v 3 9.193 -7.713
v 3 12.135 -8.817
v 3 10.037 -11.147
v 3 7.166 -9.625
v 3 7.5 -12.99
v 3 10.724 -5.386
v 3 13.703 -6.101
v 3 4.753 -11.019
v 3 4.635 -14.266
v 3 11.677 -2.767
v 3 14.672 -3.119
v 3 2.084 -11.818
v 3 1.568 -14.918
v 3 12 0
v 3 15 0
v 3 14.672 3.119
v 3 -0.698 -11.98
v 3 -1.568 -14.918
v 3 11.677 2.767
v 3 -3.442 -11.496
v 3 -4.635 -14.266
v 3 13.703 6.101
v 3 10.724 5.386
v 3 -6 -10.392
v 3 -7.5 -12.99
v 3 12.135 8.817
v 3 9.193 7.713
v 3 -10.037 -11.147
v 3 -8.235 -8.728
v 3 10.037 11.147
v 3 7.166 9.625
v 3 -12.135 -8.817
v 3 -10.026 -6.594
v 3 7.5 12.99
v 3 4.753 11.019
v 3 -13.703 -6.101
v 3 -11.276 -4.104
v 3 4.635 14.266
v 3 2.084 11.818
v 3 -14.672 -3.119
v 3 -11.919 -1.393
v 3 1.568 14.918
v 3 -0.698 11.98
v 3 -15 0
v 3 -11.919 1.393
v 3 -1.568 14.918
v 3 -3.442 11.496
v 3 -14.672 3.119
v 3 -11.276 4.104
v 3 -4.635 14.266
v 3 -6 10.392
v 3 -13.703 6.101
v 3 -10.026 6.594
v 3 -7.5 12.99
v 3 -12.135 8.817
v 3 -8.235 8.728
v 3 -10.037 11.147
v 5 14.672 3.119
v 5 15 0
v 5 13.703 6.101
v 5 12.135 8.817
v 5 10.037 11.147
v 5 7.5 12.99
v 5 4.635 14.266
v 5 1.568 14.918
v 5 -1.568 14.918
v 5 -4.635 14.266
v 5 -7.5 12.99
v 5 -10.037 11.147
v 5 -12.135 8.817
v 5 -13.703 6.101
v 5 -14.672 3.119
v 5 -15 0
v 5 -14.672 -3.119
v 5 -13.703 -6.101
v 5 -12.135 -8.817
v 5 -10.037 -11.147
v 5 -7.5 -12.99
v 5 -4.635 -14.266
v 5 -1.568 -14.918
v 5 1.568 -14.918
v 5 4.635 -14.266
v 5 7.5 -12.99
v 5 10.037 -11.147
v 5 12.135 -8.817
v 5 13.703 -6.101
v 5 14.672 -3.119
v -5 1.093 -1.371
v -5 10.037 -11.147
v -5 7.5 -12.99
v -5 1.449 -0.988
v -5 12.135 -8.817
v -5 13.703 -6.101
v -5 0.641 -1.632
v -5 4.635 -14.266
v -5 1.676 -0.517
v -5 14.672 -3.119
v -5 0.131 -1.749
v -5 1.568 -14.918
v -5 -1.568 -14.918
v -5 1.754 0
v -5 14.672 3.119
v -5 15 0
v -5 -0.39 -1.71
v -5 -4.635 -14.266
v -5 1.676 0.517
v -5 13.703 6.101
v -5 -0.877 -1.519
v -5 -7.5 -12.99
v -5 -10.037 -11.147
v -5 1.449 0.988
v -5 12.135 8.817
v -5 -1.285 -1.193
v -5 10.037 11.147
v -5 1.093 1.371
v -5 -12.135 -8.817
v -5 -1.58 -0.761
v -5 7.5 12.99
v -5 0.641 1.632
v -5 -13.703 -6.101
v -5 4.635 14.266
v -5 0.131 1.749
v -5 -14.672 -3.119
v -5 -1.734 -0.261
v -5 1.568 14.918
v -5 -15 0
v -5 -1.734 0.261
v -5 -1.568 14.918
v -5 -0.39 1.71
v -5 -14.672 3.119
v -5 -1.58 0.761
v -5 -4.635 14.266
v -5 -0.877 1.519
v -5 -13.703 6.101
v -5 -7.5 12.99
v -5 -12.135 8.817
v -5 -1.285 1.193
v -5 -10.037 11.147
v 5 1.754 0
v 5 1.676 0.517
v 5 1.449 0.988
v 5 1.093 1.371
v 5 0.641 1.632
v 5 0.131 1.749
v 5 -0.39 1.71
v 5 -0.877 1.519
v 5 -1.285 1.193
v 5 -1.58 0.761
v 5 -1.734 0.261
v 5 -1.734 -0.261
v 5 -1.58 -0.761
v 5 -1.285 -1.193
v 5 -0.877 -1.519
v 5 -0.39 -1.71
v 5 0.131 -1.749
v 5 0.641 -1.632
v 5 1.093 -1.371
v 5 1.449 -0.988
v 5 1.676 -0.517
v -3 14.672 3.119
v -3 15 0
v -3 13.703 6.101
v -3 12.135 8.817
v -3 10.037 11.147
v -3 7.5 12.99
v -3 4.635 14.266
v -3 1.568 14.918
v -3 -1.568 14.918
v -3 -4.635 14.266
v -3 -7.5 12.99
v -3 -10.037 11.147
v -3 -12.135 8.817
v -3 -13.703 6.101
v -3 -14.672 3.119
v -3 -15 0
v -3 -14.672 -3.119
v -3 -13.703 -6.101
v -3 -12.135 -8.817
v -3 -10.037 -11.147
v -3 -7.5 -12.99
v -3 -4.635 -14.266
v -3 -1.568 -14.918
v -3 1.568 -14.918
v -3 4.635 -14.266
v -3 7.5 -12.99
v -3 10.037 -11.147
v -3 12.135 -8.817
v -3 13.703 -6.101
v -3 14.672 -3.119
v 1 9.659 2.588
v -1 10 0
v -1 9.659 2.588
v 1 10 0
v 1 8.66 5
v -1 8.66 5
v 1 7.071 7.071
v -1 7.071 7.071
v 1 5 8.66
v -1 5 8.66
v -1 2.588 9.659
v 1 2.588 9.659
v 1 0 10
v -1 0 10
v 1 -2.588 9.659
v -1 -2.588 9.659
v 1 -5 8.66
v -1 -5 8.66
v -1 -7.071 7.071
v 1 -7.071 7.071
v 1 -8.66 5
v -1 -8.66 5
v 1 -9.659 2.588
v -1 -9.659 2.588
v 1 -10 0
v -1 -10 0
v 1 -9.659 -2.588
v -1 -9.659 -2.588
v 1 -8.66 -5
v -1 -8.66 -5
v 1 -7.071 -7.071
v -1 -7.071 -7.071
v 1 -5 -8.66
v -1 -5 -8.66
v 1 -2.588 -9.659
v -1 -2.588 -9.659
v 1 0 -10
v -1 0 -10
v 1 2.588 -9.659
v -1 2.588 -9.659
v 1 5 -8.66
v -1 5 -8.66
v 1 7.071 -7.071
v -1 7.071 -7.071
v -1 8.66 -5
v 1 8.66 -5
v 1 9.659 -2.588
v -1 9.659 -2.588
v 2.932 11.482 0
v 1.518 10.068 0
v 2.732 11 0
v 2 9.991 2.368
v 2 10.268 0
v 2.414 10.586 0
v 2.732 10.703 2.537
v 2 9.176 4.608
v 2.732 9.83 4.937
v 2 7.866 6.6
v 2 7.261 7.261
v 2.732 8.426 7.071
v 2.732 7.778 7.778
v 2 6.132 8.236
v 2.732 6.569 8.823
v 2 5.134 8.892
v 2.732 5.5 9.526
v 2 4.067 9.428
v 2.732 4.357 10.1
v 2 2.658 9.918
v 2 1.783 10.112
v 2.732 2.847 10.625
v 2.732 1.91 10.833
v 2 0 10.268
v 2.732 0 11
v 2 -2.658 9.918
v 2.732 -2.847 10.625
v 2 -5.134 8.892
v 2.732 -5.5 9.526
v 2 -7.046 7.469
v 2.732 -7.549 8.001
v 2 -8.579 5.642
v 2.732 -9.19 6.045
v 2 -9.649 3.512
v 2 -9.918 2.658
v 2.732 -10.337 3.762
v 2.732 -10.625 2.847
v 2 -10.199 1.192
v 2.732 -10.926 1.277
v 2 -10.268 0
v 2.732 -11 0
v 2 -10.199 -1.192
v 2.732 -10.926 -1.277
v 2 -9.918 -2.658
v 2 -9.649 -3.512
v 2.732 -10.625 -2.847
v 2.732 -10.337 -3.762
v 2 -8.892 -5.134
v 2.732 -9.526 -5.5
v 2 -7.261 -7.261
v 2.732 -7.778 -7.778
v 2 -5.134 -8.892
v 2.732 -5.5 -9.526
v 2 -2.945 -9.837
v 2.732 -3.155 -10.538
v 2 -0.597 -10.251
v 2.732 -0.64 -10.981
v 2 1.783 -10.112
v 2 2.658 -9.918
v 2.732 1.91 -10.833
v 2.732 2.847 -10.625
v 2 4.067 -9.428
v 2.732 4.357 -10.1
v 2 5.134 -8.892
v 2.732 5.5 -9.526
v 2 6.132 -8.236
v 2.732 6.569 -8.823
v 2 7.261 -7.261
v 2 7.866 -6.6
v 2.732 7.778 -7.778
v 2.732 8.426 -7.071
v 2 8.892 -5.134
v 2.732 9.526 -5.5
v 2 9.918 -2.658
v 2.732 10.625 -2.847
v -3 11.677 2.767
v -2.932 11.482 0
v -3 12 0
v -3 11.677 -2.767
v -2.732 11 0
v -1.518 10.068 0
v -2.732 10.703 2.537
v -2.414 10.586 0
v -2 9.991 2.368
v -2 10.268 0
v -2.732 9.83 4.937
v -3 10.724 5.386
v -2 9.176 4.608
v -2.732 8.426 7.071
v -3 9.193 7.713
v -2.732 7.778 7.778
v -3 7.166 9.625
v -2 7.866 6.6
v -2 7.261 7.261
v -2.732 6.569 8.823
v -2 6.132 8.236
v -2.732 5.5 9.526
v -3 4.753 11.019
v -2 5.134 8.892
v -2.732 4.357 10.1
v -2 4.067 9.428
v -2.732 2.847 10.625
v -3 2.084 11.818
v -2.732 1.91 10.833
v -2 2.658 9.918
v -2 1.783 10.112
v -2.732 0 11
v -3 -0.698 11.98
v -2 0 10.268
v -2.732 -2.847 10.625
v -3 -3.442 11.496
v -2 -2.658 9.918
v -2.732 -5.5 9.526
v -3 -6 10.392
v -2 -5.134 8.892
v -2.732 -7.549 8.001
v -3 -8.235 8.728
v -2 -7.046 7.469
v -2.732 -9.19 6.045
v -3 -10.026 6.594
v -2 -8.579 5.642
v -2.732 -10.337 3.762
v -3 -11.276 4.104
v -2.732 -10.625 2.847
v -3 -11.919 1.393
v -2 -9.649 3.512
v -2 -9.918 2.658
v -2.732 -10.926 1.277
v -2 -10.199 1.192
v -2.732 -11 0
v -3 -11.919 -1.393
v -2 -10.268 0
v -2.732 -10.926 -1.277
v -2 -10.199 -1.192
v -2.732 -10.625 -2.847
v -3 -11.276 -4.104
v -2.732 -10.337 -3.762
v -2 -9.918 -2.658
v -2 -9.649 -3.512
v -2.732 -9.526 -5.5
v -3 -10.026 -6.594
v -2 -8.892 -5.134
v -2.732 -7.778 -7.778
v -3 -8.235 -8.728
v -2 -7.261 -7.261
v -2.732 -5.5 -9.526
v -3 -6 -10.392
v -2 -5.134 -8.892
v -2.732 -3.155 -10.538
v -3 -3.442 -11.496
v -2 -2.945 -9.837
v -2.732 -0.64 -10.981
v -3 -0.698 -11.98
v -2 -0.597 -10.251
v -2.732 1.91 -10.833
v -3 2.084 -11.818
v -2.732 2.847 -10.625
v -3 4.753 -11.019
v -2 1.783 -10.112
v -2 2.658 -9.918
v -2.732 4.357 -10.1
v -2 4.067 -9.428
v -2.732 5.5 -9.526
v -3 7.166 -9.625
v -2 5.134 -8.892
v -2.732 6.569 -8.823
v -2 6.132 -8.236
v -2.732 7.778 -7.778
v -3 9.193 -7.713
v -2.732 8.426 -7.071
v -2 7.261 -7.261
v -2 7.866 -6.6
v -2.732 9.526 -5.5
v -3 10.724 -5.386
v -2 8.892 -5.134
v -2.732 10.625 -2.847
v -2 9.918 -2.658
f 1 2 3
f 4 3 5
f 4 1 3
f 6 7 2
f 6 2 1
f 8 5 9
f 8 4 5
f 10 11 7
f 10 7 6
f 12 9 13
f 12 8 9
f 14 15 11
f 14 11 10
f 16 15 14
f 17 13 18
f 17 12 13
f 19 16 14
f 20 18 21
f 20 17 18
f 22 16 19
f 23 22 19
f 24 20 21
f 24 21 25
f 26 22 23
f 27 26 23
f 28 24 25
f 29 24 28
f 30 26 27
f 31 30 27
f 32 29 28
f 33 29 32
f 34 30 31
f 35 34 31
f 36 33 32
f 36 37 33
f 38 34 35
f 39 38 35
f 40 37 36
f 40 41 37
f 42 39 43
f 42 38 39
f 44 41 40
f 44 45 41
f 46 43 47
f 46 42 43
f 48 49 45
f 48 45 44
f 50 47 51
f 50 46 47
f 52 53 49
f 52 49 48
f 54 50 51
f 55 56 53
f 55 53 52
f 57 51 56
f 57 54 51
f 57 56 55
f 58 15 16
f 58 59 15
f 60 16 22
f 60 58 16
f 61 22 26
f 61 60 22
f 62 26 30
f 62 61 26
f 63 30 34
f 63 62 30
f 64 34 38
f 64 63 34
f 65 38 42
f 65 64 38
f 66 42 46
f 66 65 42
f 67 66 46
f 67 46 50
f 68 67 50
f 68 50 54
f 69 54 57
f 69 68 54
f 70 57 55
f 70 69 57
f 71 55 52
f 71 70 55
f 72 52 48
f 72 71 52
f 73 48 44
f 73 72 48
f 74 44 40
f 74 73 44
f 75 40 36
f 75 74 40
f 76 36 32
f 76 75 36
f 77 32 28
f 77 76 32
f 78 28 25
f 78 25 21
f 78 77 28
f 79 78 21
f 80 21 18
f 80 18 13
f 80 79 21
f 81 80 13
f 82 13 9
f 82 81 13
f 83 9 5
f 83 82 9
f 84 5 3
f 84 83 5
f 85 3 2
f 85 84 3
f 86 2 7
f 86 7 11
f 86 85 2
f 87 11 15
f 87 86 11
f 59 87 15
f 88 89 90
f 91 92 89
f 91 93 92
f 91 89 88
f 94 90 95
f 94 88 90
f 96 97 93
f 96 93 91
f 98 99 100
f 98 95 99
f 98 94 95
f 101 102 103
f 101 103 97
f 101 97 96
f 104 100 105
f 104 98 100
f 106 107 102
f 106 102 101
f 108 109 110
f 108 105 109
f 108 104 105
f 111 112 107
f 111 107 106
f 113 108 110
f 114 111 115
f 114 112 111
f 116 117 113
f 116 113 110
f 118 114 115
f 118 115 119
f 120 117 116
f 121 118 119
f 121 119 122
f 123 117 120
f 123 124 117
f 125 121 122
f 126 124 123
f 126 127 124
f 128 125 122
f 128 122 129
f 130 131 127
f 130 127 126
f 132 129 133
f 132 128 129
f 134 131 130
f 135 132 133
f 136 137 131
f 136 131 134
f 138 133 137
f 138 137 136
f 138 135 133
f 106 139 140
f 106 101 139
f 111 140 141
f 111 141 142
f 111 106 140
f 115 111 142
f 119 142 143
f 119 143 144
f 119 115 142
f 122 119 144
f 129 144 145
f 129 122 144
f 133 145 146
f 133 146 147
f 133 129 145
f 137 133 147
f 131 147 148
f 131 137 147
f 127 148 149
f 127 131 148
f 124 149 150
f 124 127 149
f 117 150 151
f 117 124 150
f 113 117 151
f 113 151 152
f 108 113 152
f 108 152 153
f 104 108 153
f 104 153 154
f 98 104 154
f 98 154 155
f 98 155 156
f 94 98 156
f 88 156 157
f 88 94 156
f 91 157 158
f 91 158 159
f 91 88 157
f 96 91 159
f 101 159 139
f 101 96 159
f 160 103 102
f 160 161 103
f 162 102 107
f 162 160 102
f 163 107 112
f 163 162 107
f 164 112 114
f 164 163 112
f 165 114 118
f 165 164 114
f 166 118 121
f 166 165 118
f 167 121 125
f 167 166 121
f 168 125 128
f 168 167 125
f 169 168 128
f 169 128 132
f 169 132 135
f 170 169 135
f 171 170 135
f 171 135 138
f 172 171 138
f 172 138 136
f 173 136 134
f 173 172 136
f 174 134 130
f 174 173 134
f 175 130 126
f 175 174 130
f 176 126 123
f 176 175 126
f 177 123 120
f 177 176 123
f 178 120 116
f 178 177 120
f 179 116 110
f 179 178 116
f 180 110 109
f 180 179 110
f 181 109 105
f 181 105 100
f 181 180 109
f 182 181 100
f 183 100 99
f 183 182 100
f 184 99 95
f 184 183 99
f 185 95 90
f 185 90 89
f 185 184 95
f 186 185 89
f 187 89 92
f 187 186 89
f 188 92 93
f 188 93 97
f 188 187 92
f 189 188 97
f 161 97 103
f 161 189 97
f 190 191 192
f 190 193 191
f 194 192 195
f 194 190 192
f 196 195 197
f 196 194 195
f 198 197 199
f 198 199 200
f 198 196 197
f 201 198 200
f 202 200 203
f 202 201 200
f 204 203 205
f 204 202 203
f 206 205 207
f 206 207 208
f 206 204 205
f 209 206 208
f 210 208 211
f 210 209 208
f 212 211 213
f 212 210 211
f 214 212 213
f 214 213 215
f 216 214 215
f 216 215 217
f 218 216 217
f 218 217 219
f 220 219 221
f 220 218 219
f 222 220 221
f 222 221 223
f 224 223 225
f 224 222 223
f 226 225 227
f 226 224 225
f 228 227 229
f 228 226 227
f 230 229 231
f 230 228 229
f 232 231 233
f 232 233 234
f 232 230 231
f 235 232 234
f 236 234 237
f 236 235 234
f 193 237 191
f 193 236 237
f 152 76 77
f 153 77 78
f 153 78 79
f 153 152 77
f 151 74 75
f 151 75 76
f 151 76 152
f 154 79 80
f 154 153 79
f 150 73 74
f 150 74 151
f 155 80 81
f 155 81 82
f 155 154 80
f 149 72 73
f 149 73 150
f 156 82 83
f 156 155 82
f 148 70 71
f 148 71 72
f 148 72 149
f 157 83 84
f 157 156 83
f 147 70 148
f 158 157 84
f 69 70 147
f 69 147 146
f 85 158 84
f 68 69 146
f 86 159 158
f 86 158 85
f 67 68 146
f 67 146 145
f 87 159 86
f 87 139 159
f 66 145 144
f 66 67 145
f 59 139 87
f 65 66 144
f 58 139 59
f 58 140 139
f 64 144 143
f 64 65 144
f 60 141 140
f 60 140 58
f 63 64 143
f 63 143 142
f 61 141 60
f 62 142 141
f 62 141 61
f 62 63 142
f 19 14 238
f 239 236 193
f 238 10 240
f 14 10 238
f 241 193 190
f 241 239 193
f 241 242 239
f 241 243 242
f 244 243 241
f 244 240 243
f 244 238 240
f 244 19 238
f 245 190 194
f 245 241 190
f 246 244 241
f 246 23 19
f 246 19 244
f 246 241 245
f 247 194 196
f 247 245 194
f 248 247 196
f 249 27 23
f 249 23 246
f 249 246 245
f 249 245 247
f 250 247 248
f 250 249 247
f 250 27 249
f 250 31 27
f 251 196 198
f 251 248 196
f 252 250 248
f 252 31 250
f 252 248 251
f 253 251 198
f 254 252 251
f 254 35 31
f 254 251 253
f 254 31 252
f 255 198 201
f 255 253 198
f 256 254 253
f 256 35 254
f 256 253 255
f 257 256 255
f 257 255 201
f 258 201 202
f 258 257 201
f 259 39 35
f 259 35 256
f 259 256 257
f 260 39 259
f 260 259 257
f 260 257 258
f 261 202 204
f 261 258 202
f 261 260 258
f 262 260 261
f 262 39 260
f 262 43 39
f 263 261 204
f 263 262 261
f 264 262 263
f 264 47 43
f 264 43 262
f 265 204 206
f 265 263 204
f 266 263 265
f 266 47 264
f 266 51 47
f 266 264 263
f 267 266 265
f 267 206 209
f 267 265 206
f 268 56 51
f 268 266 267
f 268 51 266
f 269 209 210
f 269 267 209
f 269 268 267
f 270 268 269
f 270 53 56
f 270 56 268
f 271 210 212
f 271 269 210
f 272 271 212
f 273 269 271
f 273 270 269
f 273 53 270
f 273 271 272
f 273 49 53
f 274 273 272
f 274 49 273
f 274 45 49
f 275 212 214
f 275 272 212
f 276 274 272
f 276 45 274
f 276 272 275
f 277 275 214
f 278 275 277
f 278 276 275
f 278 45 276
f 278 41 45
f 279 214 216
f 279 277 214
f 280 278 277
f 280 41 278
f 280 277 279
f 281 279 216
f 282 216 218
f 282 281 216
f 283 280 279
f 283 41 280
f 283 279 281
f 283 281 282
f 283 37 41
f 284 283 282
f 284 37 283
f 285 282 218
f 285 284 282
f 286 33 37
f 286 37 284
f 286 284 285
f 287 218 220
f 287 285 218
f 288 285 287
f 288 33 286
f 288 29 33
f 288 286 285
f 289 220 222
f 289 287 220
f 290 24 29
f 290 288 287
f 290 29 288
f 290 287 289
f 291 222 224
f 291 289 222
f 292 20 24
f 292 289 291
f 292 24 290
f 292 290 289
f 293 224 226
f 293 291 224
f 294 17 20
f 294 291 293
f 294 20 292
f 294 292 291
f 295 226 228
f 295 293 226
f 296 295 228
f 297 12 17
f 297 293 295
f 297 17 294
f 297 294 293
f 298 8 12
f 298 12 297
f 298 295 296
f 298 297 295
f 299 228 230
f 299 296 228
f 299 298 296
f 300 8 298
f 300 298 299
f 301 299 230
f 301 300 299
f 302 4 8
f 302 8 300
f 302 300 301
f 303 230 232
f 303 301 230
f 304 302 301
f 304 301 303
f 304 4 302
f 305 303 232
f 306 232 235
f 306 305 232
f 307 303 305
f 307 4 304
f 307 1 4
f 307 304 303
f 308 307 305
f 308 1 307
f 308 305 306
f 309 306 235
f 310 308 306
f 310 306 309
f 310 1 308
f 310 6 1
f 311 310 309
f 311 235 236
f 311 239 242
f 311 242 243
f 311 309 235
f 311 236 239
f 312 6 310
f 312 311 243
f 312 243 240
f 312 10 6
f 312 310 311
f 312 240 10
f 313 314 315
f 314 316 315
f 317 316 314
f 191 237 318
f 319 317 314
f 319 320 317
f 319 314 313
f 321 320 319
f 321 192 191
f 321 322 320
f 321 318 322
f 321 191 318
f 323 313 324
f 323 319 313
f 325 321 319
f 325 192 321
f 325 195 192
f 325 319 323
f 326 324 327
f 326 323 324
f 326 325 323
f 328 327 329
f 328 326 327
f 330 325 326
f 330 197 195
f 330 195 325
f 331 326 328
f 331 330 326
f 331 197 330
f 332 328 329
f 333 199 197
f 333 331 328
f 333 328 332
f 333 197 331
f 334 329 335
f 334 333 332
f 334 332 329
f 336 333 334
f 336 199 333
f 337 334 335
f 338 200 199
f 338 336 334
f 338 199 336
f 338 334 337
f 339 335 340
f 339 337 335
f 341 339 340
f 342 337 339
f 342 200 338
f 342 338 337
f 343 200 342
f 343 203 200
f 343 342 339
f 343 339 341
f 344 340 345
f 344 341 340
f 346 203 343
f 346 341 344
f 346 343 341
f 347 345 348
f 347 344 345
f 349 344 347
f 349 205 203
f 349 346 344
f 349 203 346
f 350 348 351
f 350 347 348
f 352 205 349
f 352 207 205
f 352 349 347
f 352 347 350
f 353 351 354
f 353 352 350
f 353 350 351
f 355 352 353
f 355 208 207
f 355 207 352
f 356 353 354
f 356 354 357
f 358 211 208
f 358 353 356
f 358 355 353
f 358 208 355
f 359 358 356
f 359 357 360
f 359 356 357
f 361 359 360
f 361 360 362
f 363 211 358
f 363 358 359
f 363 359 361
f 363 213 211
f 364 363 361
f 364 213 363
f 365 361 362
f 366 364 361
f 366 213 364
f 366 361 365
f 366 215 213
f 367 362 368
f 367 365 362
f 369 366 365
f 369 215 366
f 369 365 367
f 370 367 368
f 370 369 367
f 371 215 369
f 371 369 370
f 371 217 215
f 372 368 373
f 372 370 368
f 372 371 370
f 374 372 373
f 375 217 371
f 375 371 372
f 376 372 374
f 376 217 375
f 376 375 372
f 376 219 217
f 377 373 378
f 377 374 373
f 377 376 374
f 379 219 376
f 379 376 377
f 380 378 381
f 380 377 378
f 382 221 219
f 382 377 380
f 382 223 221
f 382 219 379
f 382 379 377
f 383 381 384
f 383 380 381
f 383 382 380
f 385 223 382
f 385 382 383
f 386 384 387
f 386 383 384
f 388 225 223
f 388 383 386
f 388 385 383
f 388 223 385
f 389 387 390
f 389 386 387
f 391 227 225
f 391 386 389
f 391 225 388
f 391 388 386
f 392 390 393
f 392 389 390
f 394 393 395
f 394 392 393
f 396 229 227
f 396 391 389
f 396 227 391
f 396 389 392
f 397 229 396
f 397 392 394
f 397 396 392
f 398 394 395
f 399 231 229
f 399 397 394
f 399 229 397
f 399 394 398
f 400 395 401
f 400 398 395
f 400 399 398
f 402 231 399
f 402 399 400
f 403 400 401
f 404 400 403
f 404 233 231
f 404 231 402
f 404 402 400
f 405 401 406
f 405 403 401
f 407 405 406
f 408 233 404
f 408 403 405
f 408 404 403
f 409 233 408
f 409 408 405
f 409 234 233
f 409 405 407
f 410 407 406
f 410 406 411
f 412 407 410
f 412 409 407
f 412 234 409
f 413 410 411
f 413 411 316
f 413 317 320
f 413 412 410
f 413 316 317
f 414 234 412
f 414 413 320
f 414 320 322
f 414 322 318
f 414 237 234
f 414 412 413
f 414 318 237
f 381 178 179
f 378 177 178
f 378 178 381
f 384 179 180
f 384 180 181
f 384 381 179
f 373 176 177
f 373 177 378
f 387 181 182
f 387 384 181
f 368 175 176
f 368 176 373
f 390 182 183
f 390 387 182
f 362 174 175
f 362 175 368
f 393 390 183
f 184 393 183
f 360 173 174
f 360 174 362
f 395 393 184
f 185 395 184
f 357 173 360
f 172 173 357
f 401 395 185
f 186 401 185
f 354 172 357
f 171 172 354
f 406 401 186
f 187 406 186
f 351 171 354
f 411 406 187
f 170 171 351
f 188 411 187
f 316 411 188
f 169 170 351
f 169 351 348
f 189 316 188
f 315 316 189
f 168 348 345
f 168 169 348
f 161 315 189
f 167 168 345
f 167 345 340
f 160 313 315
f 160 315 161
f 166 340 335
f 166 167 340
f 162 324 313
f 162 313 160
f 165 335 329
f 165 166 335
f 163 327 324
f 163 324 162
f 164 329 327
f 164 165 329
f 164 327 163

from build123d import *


with BuildPart() as part:
    # Sketch1 → Revolve1 (revolve)
    with BuildSketch(Plane.XY):
        with BuildLine():
            Line((-1, 10), (1, 10))
            ThreePointArc((1, 10), (2.414213562, 10.585786438), (3, 12))
            Line((3, 12), (3, 15))
            Line((3, 15), (5, 15))
            Line((5, 15), (5, 1.753554502))
            Line((5, 1.753554502), (-5, 1.753554502))
            Line((-5, 1.753554502), (-5, 15))
            Line((-5, 15), (-3, 15))
            Line((-3, 15), (-3, 12))
            ThreePointArc((-3, 12), (-2.414213562, 10.585786438), (-1, 10))
        make_face()
    revolve(axis=Axis((-9.241706161, 0, 0), (1, 0, 0)))


solid = part.part
